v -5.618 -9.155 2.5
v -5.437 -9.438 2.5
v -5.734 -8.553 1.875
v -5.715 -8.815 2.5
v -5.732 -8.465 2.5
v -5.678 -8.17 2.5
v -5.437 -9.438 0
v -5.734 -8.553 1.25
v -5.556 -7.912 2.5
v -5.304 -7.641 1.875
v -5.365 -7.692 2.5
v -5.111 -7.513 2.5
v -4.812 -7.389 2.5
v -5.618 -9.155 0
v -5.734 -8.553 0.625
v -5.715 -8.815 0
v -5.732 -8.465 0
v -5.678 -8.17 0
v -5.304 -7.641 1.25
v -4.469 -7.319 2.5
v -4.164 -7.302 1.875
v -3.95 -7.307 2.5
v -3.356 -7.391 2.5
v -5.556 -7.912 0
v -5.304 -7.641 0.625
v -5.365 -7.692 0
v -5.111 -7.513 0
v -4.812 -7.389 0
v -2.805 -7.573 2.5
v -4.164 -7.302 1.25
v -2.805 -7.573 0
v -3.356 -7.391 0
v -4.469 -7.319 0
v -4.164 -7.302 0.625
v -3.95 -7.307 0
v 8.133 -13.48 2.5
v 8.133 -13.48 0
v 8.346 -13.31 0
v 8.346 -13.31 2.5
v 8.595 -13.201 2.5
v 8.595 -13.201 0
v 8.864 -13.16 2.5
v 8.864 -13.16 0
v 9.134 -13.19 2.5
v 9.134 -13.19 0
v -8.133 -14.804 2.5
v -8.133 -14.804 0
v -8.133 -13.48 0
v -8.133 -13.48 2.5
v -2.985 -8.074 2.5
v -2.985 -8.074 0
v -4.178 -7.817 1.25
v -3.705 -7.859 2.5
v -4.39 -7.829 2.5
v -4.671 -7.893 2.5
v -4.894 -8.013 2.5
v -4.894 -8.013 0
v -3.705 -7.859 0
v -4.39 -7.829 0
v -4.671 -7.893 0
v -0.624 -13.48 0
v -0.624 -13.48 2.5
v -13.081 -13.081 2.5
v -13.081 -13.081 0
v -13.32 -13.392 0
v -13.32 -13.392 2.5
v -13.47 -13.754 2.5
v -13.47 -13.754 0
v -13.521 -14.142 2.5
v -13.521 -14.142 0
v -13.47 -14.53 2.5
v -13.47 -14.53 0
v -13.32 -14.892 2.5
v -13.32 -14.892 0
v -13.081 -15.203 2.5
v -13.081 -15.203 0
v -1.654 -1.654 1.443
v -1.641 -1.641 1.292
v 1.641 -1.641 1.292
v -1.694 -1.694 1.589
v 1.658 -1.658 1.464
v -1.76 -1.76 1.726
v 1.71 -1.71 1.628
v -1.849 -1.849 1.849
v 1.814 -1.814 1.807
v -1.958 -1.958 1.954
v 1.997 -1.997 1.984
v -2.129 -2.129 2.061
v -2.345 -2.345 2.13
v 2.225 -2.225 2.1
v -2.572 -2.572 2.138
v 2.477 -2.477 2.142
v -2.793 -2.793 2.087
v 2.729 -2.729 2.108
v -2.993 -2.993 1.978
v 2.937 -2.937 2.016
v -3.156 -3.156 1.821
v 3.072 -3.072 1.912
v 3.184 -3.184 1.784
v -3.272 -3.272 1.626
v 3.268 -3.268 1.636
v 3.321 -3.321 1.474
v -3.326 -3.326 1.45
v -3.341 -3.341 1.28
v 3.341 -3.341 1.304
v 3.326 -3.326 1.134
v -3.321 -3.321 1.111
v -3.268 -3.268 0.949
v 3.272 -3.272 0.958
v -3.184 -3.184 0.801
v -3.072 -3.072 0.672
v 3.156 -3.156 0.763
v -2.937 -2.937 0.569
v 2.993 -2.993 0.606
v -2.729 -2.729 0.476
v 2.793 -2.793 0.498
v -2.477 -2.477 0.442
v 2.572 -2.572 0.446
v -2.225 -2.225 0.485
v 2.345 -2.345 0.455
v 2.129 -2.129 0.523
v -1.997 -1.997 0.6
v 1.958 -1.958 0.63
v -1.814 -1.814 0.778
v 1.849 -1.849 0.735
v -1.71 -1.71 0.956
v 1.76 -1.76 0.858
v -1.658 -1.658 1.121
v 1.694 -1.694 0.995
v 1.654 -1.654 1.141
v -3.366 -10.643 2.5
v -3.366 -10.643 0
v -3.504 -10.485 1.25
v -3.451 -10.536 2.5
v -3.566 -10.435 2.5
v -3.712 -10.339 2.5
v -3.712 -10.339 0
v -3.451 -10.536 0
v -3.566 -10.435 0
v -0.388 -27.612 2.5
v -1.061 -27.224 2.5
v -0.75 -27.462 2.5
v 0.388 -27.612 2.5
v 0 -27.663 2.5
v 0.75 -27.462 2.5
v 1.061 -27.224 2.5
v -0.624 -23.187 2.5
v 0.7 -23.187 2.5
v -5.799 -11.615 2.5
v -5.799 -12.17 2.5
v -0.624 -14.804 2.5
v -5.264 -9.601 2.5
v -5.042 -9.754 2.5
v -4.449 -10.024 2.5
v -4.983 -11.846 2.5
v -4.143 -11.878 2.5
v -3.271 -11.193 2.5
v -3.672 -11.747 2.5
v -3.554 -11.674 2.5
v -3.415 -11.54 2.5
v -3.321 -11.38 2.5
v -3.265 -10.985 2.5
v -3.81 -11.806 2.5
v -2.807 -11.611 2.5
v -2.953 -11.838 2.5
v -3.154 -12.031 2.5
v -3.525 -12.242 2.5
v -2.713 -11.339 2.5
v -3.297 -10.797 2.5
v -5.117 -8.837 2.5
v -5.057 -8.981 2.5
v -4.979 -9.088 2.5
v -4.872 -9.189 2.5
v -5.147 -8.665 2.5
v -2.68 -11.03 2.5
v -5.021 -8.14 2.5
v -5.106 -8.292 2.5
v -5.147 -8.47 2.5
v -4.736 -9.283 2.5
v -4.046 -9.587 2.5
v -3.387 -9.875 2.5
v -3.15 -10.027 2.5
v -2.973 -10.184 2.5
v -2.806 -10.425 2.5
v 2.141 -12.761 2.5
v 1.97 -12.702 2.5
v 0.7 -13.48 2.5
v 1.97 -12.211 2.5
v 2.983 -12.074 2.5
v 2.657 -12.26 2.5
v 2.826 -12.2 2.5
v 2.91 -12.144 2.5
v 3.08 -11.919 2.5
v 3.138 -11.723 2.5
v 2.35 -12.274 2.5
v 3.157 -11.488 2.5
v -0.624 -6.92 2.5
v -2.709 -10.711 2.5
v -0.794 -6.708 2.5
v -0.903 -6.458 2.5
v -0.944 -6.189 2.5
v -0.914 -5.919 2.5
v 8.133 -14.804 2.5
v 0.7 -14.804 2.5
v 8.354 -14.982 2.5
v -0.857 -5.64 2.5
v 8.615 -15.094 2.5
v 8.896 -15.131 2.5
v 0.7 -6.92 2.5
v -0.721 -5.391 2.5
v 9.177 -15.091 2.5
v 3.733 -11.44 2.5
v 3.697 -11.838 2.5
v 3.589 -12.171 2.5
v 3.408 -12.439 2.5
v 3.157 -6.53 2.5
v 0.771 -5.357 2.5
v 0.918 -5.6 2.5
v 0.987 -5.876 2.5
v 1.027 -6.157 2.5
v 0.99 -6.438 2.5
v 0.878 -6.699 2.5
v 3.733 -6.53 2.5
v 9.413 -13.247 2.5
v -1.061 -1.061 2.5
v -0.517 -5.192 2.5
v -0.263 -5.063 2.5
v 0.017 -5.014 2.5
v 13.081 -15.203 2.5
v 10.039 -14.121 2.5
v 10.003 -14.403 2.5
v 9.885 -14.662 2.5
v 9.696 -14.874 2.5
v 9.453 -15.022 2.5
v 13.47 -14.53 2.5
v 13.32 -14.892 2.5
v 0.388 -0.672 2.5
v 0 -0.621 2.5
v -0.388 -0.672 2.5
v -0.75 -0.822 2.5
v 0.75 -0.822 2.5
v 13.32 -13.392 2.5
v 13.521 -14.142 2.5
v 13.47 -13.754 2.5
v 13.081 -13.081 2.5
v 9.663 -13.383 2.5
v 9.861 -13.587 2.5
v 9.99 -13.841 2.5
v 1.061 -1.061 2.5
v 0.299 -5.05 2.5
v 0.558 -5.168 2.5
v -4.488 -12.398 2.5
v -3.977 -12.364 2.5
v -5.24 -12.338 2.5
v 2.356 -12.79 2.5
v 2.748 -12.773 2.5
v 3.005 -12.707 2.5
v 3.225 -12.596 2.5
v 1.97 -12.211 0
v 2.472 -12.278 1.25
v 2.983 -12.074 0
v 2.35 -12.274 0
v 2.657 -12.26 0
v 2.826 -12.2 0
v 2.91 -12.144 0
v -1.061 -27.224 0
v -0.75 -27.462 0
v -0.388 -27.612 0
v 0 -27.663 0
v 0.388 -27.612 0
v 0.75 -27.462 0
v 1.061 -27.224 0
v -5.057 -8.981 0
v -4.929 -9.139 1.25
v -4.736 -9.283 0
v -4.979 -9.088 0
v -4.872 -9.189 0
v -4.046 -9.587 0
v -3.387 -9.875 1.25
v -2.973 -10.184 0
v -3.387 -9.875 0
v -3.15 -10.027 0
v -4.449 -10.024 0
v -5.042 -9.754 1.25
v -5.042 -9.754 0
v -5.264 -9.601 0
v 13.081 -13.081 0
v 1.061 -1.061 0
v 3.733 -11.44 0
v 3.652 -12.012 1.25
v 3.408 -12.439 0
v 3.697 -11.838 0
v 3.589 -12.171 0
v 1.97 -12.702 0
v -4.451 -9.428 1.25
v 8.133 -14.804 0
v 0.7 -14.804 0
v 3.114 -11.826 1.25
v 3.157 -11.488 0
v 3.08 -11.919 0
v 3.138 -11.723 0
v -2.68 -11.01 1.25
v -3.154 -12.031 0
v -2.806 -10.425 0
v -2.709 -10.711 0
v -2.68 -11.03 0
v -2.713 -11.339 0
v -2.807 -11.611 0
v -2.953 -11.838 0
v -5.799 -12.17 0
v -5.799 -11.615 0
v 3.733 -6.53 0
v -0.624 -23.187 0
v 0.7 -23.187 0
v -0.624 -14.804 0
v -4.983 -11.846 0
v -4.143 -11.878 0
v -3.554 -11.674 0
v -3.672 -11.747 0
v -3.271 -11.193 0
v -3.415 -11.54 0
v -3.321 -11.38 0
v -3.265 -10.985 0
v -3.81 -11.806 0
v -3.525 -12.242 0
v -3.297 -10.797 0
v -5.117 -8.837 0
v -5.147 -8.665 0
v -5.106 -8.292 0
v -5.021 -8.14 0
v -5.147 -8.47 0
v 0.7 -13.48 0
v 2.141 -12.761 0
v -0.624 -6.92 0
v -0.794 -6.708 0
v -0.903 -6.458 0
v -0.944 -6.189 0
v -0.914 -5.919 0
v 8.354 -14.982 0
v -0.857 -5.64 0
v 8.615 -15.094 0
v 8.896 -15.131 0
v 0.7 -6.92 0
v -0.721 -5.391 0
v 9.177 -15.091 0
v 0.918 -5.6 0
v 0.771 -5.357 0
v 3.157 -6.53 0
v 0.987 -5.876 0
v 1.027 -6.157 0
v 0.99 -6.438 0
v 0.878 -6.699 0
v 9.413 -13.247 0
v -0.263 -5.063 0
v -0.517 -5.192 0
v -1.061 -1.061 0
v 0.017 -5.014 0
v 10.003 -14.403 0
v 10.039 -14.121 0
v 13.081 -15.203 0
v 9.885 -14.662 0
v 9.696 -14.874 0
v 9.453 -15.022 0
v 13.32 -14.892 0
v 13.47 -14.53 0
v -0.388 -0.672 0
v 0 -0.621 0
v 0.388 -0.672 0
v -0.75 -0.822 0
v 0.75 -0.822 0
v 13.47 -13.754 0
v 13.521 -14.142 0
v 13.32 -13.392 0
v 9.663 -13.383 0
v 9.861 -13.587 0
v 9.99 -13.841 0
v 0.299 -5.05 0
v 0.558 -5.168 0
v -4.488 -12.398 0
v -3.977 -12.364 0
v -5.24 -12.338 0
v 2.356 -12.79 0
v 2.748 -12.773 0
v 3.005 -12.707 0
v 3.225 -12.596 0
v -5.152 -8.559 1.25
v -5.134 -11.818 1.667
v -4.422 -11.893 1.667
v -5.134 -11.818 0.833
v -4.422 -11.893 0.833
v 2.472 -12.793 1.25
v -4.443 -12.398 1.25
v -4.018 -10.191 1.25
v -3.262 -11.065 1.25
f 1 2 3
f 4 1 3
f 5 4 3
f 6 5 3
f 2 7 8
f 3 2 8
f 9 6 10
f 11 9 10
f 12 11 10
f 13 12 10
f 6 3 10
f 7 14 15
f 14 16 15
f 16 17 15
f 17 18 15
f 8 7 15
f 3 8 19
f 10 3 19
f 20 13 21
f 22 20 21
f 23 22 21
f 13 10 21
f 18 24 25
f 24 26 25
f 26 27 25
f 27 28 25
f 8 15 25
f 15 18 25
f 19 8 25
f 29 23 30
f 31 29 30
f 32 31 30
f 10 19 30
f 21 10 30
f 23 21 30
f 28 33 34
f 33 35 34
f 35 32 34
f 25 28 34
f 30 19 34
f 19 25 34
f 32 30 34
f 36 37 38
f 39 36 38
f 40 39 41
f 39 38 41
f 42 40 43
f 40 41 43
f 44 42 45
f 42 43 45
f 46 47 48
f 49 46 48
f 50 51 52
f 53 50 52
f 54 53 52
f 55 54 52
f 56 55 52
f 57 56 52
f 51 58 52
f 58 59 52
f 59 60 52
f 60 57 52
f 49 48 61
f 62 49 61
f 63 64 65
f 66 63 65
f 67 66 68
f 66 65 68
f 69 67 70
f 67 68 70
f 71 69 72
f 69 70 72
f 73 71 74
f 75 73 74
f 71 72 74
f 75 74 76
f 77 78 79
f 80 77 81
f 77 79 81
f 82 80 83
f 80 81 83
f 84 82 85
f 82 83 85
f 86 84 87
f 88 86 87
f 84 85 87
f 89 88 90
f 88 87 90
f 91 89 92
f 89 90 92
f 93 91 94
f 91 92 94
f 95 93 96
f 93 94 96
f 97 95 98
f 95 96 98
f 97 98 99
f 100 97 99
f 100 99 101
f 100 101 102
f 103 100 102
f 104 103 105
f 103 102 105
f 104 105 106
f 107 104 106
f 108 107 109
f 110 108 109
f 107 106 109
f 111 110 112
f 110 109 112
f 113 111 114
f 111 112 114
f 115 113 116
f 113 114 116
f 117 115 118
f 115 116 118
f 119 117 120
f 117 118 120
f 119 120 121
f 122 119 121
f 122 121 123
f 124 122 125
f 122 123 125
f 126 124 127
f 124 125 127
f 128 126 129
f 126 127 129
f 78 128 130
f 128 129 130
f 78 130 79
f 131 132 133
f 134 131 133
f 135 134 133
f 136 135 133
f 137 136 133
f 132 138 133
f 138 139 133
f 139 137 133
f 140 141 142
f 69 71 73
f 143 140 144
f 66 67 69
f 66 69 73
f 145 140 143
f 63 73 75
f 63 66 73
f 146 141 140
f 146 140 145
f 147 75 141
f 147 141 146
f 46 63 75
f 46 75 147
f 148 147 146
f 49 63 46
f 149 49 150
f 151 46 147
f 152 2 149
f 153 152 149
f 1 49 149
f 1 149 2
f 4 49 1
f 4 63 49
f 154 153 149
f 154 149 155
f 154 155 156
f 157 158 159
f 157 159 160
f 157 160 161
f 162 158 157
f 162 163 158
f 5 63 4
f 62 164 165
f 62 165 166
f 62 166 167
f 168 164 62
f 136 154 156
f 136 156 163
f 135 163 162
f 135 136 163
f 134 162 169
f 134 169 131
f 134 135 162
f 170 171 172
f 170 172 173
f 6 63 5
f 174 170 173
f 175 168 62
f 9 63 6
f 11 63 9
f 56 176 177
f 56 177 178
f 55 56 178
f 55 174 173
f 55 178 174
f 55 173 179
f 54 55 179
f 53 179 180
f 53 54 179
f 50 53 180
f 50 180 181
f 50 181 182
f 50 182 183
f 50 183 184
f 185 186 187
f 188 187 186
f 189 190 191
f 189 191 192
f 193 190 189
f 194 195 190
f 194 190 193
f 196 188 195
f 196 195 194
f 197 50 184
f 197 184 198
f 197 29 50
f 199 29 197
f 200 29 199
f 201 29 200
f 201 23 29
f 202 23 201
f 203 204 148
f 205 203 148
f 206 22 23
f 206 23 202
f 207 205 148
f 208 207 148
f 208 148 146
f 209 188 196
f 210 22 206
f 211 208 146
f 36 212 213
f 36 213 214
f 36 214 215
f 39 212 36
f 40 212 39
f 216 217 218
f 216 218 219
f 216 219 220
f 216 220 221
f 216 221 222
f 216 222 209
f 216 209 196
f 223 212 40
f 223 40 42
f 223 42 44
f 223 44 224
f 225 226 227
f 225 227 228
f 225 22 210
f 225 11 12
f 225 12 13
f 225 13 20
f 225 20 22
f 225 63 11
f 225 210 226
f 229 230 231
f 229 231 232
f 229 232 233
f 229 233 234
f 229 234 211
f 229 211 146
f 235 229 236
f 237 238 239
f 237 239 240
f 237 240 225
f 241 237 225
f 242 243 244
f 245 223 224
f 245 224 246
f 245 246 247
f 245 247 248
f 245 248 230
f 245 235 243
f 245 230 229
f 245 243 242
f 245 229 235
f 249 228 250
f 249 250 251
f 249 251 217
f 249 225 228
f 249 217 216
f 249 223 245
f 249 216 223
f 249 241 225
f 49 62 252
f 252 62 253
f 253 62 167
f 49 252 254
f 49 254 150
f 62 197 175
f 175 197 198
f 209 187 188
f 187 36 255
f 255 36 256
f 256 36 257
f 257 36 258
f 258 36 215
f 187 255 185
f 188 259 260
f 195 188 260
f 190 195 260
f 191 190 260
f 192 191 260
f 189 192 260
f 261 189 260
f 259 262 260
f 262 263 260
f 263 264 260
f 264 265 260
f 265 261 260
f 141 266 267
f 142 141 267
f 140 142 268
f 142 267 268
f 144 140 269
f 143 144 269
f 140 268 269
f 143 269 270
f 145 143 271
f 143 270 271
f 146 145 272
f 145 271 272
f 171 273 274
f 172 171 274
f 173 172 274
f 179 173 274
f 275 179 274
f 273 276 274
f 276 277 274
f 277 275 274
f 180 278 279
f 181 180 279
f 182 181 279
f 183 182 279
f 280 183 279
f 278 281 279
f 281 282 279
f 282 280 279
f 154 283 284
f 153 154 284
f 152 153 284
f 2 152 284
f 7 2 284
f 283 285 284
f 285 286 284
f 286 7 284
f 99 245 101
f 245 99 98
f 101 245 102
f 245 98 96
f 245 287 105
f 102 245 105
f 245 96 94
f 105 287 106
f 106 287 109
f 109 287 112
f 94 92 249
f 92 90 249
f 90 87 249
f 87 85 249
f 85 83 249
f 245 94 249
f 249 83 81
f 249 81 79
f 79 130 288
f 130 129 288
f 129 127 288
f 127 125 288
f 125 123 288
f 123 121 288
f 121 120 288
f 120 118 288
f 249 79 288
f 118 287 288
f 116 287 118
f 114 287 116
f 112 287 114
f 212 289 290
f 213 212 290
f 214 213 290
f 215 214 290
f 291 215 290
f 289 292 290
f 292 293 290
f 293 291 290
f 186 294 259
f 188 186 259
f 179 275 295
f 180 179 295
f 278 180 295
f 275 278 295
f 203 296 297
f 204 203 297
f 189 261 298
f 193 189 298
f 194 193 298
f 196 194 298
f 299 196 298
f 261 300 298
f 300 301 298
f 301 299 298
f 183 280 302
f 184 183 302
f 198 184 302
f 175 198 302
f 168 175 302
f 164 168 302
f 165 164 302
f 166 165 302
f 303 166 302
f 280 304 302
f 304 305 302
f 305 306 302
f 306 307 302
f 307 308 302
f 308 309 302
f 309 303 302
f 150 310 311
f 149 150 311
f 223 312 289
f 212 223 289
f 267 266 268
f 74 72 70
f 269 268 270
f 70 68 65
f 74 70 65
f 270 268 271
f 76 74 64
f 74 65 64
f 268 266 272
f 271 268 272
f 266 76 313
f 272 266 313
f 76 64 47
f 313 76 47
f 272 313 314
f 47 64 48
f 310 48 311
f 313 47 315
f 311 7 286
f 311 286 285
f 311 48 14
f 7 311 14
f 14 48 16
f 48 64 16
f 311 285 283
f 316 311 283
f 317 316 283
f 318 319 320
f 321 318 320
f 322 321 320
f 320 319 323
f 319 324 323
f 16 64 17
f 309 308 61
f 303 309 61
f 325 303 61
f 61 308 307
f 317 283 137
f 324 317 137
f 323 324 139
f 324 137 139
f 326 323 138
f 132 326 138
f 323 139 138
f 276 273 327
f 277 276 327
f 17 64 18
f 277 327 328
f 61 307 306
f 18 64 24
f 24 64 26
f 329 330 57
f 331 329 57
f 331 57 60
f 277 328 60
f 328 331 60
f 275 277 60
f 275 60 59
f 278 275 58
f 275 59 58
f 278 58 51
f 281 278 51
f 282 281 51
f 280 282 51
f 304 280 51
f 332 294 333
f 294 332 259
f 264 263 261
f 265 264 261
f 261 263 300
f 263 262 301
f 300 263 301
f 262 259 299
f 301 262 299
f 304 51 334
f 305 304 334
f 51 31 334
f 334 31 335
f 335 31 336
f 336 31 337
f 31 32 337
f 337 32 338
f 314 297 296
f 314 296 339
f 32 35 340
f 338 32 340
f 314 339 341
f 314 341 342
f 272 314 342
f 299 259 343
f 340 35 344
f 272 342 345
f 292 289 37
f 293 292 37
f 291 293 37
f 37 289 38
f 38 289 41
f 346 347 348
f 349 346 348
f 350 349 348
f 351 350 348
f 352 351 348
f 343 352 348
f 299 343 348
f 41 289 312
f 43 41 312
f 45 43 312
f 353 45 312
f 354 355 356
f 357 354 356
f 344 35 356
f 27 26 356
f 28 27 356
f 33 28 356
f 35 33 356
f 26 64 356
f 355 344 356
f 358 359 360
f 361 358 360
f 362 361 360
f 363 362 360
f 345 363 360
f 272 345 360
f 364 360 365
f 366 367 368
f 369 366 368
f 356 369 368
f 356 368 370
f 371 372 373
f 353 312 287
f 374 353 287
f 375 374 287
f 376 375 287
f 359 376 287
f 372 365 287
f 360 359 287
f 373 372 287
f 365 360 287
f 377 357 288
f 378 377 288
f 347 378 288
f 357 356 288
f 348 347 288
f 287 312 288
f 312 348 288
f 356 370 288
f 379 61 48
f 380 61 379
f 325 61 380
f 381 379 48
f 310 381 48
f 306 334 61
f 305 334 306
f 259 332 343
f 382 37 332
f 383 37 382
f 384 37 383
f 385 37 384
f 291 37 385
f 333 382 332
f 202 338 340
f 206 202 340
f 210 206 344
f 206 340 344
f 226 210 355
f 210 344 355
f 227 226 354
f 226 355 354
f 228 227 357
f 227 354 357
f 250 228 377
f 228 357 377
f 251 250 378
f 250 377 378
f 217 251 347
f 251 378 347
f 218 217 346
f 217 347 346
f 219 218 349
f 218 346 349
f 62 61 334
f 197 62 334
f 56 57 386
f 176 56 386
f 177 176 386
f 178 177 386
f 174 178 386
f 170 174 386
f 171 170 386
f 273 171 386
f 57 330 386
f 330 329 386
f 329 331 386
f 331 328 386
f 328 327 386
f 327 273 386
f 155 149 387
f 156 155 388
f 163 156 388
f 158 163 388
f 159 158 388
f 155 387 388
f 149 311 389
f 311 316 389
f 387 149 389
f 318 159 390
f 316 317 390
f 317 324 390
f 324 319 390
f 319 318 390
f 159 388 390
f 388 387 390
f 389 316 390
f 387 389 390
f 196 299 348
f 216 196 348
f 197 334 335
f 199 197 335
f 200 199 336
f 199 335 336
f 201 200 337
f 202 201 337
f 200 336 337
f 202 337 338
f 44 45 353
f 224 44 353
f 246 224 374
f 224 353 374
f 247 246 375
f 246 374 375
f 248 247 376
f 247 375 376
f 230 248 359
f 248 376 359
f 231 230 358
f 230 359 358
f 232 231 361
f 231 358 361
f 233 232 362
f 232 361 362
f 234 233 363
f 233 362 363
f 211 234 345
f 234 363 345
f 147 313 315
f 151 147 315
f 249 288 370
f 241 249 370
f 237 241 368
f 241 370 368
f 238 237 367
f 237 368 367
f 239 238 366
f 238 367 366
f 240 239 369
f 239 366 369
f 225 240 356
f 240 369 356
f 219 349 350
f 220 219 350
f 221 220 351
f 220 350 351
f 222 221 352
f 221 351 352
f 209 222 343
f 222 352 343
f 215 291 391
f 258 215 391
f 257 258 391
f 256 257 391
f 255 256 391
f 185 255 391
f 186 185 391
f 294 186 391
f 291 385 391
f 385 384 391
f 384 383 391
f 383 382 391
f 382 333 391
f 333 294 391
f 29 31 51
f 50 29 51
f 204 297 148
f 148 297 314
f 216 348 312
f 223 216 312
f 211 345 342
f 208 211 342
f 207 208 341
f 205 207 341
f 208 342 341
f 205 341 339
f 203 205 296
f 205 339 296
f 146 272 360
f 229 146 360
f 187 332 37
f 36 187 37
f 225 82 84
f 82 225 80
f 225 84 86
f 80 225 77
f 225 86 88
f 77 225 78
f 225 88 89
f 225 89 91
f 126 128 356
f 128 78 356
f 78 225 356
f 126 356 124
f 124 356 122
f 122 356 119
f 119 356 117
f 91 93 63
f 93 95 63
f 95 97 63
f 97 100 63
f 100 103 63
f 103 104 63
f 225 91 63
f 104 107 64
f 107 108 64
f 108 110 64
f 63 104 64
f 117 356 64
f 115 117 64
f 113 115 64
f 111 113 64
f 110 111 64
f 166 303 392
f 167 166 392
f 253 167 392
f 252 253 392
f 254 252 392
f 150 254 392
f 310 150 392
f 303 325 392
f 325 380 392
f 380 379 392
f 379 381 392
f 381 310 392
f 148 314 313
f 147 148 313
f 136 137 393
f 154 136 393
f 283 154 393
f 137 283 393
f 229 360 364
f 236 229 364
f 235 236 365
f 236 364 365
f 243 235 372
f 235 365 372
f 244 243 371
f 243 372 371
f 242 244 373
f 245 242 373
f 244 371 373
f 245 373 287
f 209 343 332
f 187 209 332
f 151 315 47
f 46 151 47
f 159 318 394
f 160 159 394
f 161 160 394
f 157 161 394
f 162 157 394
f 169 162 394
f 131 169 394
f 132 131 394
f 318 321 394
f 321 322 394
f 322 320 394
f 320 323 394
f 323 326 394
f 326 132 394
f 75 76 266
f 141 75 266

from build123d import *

# Parameters (mm, degrees)
F1_DEPTH = 2.5
F2_R     = 0.85
F3_DEPTH = 12.5


with BuildPart() as f1:
    # F0 (on Top) → F1 (new body)
    with BuildSketch(Plane.XY):
        with BuildLine():
            Line((13.081475452, -13.081475452), (1.0606601718, -1.0606601718))
            ThreePointArc((1.0606601718, -1.0606601718), (0, -0.6213203436), (-1.0606601718, -1.0606601718))
            Line((-1.0606601718, -1.0606601718), (-13.081475452, -13.081475452))
            ThreePointArc((-13.081475452, -13.081475452), (-13.5208152802, -14.1421356237), (-13.081475452, -15.2027957955))
            Line((-13.081475452, -15.2027957955), (-1.0606601718, -27.2236110757))
            ThreePointArc((-1.0606601718, -27.2236110757), (0, -27.6629509039), (1.0606601718, -27.2236110757))
            Line((1.0606601718, -27.2236110757), (13.081475452, -15.2027957955))
            ThreePointArc((13.081475452, -15.2027957955), (13.5208152802, -14.1421356237), (13.081475452, -13.081475452))
        make_face()
        with BuildLine():
            add(Edge.make_bspline(
                [(-2.9727151348, -10.1835160413), (-2.6797463848, -10.5025264579), (-2.6797463848, -11.0103389579)],
                knots=[0, 0, 0, 1, 1, 1], degree=2))
            add(Edge.make_bspline(
                [(-2.6797463848, -11.0103389579), (-2.6797463848, -11.6646358329), (-3.1544642668, -12.0313893052)],
                knots=[0, 0, 0, 1, 1, 1], degree=2))
            add(Edge.make_bspline(
                [(-3.1544642668, -12.0313893052), (-3.6291821487, -12.3981427774), (-4.4429842321, -12.3981427774)],
                knots=[0, 0, 0, 1, 1, 1], degree=2))
            add(Edge.make_bspline(
                [(-4.4429842321, -12.3981427774), (-5.3240606209, -12.3981427774), (-5.7993210376, -12.170278194)],
                knots=[0, 0, 0, 1, 1, 1], degree=2))
            Line((-5.7993210376, -12.170278194), (-5.7993210376, -11.6147226385))
            add(Edge.make_bspline(
                [(-5.7993210376, -11.6147226385), (-5.4933314543, -11.7427608329), (-5.1341734682, -11.8176306246)],
                knots=[0, 0, 0, 1, 1, 1], degree=2))
            add(Edge.make_bspline(
                [(-5.1341734682, -11.8176306246), (-4.7750154821, -11.8925004163), (-4.4223679126, -11.8925004163)],
                knots=[0, 0, 0, 1, 1, 1], degree=2))
            add(Edge.make_bspline(
                [(-4.4223679126, -11.8925004163), (-3.8461960376, -11.8925004163), (-3.5543123571, -11.6738589232)],
                knots=[0, 0, 0, 1, 1, 1], degree=2))
            add(Edge.make_bspline(
                [(-3.5543123571, -11.6738589232), (-3.2624286765, -11.4552174302), (-3.2624286765, -11.0645924302)],
                knots=[0, 0, 0, 1, 1, 1], degree=2))
            add(Edge.make_bspline(
                [(-3.2624286765, -11.0645924302), (-3.2624286765, -10.8074309718), (-3.3660528084, -10.643042951)],
                knots=[0, 0, 0, 1, 1, 1], degree=2))
            add(Edge.make_bspline(
                [(-3.3660528084, -10.643042951), (-3.4696769404, -10.4786549302), (-3.7121899612, -10.3392235065)],
                knots=[0, 0, 0, 1, 1, 1], degree=2))
            add(Edge.make_bspline(
                [(-3.7121899612, -10.3392235065), (-3.9547029821, -10.1997920829), (-4.4494946487, -10.0240108329)],
                knots=[0, 0, 0, 1, 1, 1], degree=2))
            add(Edge.make_bspline(
                [(-4.4494946487, -10.0240108329), (-5.1406838848, -9.7766149996), (-5.4374503779, -9.4375307982)],
                knots=[0, 0, 0, 1, 1, 1], degree=2))
            add(Edge.make_bspline(
                [(-5.4374503779, -9.4375307982), (-5.7342168709, -9.0984465968), (-5.7342168709, -8.5526566663)],
                knots=[0, 0, 0, 1, 1, 1], degree=2))
            add(Edge.make_bspline(
                [(-5.7342168709, -8.5526566663), (-5.7342168709, -7.9797399996), (-5.3039868362, -7.6406557982)],
                knots=[0, 0, 0, 1, 1, 1], degree=2))
            add(Edge.make_bspline(
                [(-5.3039868362, -7.6406557982), (-4.8737568015, -7.3015715968), (-4.1641213848, -7.3015715968)],
                knots=[0, 0, 0, 1, 1, 1], degree=2))
            add(Edge.make_bspline(
                [(-4.1641213848, -7.3015715968), (-3.4251890932, -7.3015715968), (-2.8045293709, -7.5728389579)],
                knots=[0, 0, 0, 1, 1, 1], degree=2))
            Line((-2.8045293709, -7.5728389579), (-2.9846508987, -8.0741410413))
            add(Edge.make_bspline(
                [(-2.9846508987, -8.0741410413), (-3.5988002043, -7.8169795829), (-4.1782272876, -7.8169795829)],
                knots=[0, 0, 0, 1, 1, 1], degree=2))
            add(Edge.make_bspline(
                [(-4.1782272876, -7.8169795829), (-4.6361265932, -7.8169795829), (-4.8938305862, -8.0133771524)],
                knots=[0, 0, 0, 1, 1, 1], degree=2))
            add(Edge.make_bspline(
                [(-4.8938305862, -8.0133771524), (-5.1515345793, -8.2097747218), (-5.1515345793, -8.5591670829)],
                knots=[0, 0, 0, 1, 1, 1], degree=2))
            add(Edge.make_bspline(
                [(-5.1515345793, -8.5591670829), (-5.1515345793, -8.8163285413), (-5.0565910029, -8.9812590968)],
                knots=[0, 0, 0, 1, 1, 1], degree=2))
            add(Edge.make_bspline(
                [(-5.0565910029, -8.9812590968), (-4.9616474265, -9.1461896524), (-4.7359529821, -9.2834509371)],
                knots=[0, 0, 0, 1, 1, 1], degree=2))
            add(Edge.make_bspline(
                [(-4.7359529821, -9.2834509371), (-4.5102585376, -9.4207122218), (-4.0458488154, -9.5867278468)],
                knots=[0, 0, 0, 1, 1, 1], degree=2))
            add(Edge.make_bspline(
                [(-4.0458488154, -9.5867278468), (-3.2656838848, -9.8645056246), (-2.9727151348, -10.1835160413)],
                knots=[0, 0, 0, 1, 1, 1], degree=2))
        make_face(mode=Mode.SUBTRACT)
        with BuildLine():
            Line((-8.1334756687, -14.8039748892), (-8.1334756687, -13.4802963582))
            Line((-8.1334756687, -13.4802963582), (-0.6236797201, -13.4802963582))
            Line((-0.6236797201, -13.4802963582), (-0.6236797201, -6.9198086858))
            ThreePointArc((-0.6236797201, -6.9198086858), (-0.9032194318, -6.4583786209), (-0.9135835525, -5.9189782686))
            ThreePointArc((-0.9135835525, -5.9189782686), (0.0168397474, -5.0141534426), (0.9868078824, -5.876451129))
            ThreePointArc((0.9868078824, -5.876451129), (0.9900106564, -6.4384308628), (0.6999988109, -6.9198086858))
            Line((0.6999988109, -6.9198086858), (0.6999988109, -13.4802963582))
            Line((0.6999988109, -13.4802963582), (8.1334756687, -13.4802963582))
            ThreePointArc((8.1334756687, -13.4802963582), (8.5949057336, -13.2007566465), (9.134306086, -13.1903925258))
            ThreePointArc((9.134306086, -13.1903925258), (10.0391309119, -14.1208158258), (9.1768332255, -15.0907839607))
            ThreePointArc((9.1768332255, -15.0907839607), (8.6148534917, -15.0939867347), (8.1334756687, -14.8039748892))
            Line((8.1334756687, -14.8039748892), (0.6999988109, -14.8039748892))
            Line((0.6999988109, -14.8039748892), (0.6999988109, -23.1867600232))
            Line((0.6999988109, -23.1867600232), (-0.6236797201, -23.1867600232))
            Line((-0.6236797201, -23.1867600232), (-0.6236797201, -14.8039748892))
            Line((-0.6236797201, -14.8039748892), (-8.1334756687, -14.8039748892))
        make_face(mode=Mode.SUBTRACT)
        with BuildLine():
            add(Edge.make_bspline(
                [(3.4079297135, -12.4389777291), (3.0824088802, -12.7932529027), (2.471514783, -12.7932529027)],
                knots=[0, 0, 0, 1, 1, 1], degree=2))
            add(Edge.make_bspline(
                [(2.471514783, -12.7932529027), (2.1535894357, -12.7932529027), (1.9702126996, -12.7021070694)],
                knots=[0, 0, 0, 1, 1, 1], degree=2))
            Line((1.9702126996, -12.7021070694), (1.9702126996, -12.2105706111))
            add(Edge.make_bspline(
                [(1.9702126996, -12.2105706111), (2.2110981163, -12.2778449166), (2.471514783, -12.2778449166)],
                knots=[0, 0, 0, 1, 1, 1], degree=2))
            add(Edge.make_bspline(
                [(2.471514783, -12.2778449166), (2.8078863107, -12.2778449166), (2.9825824913, -12.0743943958)],
                knots=[0, 0, 0, 1, 1, 1], degree=2))
            add(Edge.make_bspline(
                [(2.9825824913, -12.0743943958), (3.1572786719, -11.8709438749), (3.1572786719, -11.4879143611)],
                knots=[0, 0, 0, 1, 1, 1], degree=2))
            Line((3.1572786719, -11.4879143611), (3.1572786719, -6.5302320694))
            Line((3.1572786719, -6.5302320694), (3.7334505469, -6.5302320694))
            Line((3.7334505469, -6.5302320694), (3.7334505469, -11.4401713055))
            add(Edge.make_bspline(
                [(3.7334505469, -11.4401713055), (3.7334505469, -12.0847025555), (3.4079297135, -12.4389777291)],
                knots=[0, 0, 0, 1, 1, 1], degree=2))
        make_face(mode=Mode.SUBTRACT)
    extrude(amount=F1_DEPTH)

    # F2 (on Right) → F3 (cut, symmetric)
    with BuildSketch(Plane.YZ):
        with Locations((-2.4908210296, 1.292226194)):
            Circle(F2_R)
    extrude(amount=F3_DEPTH, both=True, mode=Mode.SUBTRACT)


solid = f1.part
